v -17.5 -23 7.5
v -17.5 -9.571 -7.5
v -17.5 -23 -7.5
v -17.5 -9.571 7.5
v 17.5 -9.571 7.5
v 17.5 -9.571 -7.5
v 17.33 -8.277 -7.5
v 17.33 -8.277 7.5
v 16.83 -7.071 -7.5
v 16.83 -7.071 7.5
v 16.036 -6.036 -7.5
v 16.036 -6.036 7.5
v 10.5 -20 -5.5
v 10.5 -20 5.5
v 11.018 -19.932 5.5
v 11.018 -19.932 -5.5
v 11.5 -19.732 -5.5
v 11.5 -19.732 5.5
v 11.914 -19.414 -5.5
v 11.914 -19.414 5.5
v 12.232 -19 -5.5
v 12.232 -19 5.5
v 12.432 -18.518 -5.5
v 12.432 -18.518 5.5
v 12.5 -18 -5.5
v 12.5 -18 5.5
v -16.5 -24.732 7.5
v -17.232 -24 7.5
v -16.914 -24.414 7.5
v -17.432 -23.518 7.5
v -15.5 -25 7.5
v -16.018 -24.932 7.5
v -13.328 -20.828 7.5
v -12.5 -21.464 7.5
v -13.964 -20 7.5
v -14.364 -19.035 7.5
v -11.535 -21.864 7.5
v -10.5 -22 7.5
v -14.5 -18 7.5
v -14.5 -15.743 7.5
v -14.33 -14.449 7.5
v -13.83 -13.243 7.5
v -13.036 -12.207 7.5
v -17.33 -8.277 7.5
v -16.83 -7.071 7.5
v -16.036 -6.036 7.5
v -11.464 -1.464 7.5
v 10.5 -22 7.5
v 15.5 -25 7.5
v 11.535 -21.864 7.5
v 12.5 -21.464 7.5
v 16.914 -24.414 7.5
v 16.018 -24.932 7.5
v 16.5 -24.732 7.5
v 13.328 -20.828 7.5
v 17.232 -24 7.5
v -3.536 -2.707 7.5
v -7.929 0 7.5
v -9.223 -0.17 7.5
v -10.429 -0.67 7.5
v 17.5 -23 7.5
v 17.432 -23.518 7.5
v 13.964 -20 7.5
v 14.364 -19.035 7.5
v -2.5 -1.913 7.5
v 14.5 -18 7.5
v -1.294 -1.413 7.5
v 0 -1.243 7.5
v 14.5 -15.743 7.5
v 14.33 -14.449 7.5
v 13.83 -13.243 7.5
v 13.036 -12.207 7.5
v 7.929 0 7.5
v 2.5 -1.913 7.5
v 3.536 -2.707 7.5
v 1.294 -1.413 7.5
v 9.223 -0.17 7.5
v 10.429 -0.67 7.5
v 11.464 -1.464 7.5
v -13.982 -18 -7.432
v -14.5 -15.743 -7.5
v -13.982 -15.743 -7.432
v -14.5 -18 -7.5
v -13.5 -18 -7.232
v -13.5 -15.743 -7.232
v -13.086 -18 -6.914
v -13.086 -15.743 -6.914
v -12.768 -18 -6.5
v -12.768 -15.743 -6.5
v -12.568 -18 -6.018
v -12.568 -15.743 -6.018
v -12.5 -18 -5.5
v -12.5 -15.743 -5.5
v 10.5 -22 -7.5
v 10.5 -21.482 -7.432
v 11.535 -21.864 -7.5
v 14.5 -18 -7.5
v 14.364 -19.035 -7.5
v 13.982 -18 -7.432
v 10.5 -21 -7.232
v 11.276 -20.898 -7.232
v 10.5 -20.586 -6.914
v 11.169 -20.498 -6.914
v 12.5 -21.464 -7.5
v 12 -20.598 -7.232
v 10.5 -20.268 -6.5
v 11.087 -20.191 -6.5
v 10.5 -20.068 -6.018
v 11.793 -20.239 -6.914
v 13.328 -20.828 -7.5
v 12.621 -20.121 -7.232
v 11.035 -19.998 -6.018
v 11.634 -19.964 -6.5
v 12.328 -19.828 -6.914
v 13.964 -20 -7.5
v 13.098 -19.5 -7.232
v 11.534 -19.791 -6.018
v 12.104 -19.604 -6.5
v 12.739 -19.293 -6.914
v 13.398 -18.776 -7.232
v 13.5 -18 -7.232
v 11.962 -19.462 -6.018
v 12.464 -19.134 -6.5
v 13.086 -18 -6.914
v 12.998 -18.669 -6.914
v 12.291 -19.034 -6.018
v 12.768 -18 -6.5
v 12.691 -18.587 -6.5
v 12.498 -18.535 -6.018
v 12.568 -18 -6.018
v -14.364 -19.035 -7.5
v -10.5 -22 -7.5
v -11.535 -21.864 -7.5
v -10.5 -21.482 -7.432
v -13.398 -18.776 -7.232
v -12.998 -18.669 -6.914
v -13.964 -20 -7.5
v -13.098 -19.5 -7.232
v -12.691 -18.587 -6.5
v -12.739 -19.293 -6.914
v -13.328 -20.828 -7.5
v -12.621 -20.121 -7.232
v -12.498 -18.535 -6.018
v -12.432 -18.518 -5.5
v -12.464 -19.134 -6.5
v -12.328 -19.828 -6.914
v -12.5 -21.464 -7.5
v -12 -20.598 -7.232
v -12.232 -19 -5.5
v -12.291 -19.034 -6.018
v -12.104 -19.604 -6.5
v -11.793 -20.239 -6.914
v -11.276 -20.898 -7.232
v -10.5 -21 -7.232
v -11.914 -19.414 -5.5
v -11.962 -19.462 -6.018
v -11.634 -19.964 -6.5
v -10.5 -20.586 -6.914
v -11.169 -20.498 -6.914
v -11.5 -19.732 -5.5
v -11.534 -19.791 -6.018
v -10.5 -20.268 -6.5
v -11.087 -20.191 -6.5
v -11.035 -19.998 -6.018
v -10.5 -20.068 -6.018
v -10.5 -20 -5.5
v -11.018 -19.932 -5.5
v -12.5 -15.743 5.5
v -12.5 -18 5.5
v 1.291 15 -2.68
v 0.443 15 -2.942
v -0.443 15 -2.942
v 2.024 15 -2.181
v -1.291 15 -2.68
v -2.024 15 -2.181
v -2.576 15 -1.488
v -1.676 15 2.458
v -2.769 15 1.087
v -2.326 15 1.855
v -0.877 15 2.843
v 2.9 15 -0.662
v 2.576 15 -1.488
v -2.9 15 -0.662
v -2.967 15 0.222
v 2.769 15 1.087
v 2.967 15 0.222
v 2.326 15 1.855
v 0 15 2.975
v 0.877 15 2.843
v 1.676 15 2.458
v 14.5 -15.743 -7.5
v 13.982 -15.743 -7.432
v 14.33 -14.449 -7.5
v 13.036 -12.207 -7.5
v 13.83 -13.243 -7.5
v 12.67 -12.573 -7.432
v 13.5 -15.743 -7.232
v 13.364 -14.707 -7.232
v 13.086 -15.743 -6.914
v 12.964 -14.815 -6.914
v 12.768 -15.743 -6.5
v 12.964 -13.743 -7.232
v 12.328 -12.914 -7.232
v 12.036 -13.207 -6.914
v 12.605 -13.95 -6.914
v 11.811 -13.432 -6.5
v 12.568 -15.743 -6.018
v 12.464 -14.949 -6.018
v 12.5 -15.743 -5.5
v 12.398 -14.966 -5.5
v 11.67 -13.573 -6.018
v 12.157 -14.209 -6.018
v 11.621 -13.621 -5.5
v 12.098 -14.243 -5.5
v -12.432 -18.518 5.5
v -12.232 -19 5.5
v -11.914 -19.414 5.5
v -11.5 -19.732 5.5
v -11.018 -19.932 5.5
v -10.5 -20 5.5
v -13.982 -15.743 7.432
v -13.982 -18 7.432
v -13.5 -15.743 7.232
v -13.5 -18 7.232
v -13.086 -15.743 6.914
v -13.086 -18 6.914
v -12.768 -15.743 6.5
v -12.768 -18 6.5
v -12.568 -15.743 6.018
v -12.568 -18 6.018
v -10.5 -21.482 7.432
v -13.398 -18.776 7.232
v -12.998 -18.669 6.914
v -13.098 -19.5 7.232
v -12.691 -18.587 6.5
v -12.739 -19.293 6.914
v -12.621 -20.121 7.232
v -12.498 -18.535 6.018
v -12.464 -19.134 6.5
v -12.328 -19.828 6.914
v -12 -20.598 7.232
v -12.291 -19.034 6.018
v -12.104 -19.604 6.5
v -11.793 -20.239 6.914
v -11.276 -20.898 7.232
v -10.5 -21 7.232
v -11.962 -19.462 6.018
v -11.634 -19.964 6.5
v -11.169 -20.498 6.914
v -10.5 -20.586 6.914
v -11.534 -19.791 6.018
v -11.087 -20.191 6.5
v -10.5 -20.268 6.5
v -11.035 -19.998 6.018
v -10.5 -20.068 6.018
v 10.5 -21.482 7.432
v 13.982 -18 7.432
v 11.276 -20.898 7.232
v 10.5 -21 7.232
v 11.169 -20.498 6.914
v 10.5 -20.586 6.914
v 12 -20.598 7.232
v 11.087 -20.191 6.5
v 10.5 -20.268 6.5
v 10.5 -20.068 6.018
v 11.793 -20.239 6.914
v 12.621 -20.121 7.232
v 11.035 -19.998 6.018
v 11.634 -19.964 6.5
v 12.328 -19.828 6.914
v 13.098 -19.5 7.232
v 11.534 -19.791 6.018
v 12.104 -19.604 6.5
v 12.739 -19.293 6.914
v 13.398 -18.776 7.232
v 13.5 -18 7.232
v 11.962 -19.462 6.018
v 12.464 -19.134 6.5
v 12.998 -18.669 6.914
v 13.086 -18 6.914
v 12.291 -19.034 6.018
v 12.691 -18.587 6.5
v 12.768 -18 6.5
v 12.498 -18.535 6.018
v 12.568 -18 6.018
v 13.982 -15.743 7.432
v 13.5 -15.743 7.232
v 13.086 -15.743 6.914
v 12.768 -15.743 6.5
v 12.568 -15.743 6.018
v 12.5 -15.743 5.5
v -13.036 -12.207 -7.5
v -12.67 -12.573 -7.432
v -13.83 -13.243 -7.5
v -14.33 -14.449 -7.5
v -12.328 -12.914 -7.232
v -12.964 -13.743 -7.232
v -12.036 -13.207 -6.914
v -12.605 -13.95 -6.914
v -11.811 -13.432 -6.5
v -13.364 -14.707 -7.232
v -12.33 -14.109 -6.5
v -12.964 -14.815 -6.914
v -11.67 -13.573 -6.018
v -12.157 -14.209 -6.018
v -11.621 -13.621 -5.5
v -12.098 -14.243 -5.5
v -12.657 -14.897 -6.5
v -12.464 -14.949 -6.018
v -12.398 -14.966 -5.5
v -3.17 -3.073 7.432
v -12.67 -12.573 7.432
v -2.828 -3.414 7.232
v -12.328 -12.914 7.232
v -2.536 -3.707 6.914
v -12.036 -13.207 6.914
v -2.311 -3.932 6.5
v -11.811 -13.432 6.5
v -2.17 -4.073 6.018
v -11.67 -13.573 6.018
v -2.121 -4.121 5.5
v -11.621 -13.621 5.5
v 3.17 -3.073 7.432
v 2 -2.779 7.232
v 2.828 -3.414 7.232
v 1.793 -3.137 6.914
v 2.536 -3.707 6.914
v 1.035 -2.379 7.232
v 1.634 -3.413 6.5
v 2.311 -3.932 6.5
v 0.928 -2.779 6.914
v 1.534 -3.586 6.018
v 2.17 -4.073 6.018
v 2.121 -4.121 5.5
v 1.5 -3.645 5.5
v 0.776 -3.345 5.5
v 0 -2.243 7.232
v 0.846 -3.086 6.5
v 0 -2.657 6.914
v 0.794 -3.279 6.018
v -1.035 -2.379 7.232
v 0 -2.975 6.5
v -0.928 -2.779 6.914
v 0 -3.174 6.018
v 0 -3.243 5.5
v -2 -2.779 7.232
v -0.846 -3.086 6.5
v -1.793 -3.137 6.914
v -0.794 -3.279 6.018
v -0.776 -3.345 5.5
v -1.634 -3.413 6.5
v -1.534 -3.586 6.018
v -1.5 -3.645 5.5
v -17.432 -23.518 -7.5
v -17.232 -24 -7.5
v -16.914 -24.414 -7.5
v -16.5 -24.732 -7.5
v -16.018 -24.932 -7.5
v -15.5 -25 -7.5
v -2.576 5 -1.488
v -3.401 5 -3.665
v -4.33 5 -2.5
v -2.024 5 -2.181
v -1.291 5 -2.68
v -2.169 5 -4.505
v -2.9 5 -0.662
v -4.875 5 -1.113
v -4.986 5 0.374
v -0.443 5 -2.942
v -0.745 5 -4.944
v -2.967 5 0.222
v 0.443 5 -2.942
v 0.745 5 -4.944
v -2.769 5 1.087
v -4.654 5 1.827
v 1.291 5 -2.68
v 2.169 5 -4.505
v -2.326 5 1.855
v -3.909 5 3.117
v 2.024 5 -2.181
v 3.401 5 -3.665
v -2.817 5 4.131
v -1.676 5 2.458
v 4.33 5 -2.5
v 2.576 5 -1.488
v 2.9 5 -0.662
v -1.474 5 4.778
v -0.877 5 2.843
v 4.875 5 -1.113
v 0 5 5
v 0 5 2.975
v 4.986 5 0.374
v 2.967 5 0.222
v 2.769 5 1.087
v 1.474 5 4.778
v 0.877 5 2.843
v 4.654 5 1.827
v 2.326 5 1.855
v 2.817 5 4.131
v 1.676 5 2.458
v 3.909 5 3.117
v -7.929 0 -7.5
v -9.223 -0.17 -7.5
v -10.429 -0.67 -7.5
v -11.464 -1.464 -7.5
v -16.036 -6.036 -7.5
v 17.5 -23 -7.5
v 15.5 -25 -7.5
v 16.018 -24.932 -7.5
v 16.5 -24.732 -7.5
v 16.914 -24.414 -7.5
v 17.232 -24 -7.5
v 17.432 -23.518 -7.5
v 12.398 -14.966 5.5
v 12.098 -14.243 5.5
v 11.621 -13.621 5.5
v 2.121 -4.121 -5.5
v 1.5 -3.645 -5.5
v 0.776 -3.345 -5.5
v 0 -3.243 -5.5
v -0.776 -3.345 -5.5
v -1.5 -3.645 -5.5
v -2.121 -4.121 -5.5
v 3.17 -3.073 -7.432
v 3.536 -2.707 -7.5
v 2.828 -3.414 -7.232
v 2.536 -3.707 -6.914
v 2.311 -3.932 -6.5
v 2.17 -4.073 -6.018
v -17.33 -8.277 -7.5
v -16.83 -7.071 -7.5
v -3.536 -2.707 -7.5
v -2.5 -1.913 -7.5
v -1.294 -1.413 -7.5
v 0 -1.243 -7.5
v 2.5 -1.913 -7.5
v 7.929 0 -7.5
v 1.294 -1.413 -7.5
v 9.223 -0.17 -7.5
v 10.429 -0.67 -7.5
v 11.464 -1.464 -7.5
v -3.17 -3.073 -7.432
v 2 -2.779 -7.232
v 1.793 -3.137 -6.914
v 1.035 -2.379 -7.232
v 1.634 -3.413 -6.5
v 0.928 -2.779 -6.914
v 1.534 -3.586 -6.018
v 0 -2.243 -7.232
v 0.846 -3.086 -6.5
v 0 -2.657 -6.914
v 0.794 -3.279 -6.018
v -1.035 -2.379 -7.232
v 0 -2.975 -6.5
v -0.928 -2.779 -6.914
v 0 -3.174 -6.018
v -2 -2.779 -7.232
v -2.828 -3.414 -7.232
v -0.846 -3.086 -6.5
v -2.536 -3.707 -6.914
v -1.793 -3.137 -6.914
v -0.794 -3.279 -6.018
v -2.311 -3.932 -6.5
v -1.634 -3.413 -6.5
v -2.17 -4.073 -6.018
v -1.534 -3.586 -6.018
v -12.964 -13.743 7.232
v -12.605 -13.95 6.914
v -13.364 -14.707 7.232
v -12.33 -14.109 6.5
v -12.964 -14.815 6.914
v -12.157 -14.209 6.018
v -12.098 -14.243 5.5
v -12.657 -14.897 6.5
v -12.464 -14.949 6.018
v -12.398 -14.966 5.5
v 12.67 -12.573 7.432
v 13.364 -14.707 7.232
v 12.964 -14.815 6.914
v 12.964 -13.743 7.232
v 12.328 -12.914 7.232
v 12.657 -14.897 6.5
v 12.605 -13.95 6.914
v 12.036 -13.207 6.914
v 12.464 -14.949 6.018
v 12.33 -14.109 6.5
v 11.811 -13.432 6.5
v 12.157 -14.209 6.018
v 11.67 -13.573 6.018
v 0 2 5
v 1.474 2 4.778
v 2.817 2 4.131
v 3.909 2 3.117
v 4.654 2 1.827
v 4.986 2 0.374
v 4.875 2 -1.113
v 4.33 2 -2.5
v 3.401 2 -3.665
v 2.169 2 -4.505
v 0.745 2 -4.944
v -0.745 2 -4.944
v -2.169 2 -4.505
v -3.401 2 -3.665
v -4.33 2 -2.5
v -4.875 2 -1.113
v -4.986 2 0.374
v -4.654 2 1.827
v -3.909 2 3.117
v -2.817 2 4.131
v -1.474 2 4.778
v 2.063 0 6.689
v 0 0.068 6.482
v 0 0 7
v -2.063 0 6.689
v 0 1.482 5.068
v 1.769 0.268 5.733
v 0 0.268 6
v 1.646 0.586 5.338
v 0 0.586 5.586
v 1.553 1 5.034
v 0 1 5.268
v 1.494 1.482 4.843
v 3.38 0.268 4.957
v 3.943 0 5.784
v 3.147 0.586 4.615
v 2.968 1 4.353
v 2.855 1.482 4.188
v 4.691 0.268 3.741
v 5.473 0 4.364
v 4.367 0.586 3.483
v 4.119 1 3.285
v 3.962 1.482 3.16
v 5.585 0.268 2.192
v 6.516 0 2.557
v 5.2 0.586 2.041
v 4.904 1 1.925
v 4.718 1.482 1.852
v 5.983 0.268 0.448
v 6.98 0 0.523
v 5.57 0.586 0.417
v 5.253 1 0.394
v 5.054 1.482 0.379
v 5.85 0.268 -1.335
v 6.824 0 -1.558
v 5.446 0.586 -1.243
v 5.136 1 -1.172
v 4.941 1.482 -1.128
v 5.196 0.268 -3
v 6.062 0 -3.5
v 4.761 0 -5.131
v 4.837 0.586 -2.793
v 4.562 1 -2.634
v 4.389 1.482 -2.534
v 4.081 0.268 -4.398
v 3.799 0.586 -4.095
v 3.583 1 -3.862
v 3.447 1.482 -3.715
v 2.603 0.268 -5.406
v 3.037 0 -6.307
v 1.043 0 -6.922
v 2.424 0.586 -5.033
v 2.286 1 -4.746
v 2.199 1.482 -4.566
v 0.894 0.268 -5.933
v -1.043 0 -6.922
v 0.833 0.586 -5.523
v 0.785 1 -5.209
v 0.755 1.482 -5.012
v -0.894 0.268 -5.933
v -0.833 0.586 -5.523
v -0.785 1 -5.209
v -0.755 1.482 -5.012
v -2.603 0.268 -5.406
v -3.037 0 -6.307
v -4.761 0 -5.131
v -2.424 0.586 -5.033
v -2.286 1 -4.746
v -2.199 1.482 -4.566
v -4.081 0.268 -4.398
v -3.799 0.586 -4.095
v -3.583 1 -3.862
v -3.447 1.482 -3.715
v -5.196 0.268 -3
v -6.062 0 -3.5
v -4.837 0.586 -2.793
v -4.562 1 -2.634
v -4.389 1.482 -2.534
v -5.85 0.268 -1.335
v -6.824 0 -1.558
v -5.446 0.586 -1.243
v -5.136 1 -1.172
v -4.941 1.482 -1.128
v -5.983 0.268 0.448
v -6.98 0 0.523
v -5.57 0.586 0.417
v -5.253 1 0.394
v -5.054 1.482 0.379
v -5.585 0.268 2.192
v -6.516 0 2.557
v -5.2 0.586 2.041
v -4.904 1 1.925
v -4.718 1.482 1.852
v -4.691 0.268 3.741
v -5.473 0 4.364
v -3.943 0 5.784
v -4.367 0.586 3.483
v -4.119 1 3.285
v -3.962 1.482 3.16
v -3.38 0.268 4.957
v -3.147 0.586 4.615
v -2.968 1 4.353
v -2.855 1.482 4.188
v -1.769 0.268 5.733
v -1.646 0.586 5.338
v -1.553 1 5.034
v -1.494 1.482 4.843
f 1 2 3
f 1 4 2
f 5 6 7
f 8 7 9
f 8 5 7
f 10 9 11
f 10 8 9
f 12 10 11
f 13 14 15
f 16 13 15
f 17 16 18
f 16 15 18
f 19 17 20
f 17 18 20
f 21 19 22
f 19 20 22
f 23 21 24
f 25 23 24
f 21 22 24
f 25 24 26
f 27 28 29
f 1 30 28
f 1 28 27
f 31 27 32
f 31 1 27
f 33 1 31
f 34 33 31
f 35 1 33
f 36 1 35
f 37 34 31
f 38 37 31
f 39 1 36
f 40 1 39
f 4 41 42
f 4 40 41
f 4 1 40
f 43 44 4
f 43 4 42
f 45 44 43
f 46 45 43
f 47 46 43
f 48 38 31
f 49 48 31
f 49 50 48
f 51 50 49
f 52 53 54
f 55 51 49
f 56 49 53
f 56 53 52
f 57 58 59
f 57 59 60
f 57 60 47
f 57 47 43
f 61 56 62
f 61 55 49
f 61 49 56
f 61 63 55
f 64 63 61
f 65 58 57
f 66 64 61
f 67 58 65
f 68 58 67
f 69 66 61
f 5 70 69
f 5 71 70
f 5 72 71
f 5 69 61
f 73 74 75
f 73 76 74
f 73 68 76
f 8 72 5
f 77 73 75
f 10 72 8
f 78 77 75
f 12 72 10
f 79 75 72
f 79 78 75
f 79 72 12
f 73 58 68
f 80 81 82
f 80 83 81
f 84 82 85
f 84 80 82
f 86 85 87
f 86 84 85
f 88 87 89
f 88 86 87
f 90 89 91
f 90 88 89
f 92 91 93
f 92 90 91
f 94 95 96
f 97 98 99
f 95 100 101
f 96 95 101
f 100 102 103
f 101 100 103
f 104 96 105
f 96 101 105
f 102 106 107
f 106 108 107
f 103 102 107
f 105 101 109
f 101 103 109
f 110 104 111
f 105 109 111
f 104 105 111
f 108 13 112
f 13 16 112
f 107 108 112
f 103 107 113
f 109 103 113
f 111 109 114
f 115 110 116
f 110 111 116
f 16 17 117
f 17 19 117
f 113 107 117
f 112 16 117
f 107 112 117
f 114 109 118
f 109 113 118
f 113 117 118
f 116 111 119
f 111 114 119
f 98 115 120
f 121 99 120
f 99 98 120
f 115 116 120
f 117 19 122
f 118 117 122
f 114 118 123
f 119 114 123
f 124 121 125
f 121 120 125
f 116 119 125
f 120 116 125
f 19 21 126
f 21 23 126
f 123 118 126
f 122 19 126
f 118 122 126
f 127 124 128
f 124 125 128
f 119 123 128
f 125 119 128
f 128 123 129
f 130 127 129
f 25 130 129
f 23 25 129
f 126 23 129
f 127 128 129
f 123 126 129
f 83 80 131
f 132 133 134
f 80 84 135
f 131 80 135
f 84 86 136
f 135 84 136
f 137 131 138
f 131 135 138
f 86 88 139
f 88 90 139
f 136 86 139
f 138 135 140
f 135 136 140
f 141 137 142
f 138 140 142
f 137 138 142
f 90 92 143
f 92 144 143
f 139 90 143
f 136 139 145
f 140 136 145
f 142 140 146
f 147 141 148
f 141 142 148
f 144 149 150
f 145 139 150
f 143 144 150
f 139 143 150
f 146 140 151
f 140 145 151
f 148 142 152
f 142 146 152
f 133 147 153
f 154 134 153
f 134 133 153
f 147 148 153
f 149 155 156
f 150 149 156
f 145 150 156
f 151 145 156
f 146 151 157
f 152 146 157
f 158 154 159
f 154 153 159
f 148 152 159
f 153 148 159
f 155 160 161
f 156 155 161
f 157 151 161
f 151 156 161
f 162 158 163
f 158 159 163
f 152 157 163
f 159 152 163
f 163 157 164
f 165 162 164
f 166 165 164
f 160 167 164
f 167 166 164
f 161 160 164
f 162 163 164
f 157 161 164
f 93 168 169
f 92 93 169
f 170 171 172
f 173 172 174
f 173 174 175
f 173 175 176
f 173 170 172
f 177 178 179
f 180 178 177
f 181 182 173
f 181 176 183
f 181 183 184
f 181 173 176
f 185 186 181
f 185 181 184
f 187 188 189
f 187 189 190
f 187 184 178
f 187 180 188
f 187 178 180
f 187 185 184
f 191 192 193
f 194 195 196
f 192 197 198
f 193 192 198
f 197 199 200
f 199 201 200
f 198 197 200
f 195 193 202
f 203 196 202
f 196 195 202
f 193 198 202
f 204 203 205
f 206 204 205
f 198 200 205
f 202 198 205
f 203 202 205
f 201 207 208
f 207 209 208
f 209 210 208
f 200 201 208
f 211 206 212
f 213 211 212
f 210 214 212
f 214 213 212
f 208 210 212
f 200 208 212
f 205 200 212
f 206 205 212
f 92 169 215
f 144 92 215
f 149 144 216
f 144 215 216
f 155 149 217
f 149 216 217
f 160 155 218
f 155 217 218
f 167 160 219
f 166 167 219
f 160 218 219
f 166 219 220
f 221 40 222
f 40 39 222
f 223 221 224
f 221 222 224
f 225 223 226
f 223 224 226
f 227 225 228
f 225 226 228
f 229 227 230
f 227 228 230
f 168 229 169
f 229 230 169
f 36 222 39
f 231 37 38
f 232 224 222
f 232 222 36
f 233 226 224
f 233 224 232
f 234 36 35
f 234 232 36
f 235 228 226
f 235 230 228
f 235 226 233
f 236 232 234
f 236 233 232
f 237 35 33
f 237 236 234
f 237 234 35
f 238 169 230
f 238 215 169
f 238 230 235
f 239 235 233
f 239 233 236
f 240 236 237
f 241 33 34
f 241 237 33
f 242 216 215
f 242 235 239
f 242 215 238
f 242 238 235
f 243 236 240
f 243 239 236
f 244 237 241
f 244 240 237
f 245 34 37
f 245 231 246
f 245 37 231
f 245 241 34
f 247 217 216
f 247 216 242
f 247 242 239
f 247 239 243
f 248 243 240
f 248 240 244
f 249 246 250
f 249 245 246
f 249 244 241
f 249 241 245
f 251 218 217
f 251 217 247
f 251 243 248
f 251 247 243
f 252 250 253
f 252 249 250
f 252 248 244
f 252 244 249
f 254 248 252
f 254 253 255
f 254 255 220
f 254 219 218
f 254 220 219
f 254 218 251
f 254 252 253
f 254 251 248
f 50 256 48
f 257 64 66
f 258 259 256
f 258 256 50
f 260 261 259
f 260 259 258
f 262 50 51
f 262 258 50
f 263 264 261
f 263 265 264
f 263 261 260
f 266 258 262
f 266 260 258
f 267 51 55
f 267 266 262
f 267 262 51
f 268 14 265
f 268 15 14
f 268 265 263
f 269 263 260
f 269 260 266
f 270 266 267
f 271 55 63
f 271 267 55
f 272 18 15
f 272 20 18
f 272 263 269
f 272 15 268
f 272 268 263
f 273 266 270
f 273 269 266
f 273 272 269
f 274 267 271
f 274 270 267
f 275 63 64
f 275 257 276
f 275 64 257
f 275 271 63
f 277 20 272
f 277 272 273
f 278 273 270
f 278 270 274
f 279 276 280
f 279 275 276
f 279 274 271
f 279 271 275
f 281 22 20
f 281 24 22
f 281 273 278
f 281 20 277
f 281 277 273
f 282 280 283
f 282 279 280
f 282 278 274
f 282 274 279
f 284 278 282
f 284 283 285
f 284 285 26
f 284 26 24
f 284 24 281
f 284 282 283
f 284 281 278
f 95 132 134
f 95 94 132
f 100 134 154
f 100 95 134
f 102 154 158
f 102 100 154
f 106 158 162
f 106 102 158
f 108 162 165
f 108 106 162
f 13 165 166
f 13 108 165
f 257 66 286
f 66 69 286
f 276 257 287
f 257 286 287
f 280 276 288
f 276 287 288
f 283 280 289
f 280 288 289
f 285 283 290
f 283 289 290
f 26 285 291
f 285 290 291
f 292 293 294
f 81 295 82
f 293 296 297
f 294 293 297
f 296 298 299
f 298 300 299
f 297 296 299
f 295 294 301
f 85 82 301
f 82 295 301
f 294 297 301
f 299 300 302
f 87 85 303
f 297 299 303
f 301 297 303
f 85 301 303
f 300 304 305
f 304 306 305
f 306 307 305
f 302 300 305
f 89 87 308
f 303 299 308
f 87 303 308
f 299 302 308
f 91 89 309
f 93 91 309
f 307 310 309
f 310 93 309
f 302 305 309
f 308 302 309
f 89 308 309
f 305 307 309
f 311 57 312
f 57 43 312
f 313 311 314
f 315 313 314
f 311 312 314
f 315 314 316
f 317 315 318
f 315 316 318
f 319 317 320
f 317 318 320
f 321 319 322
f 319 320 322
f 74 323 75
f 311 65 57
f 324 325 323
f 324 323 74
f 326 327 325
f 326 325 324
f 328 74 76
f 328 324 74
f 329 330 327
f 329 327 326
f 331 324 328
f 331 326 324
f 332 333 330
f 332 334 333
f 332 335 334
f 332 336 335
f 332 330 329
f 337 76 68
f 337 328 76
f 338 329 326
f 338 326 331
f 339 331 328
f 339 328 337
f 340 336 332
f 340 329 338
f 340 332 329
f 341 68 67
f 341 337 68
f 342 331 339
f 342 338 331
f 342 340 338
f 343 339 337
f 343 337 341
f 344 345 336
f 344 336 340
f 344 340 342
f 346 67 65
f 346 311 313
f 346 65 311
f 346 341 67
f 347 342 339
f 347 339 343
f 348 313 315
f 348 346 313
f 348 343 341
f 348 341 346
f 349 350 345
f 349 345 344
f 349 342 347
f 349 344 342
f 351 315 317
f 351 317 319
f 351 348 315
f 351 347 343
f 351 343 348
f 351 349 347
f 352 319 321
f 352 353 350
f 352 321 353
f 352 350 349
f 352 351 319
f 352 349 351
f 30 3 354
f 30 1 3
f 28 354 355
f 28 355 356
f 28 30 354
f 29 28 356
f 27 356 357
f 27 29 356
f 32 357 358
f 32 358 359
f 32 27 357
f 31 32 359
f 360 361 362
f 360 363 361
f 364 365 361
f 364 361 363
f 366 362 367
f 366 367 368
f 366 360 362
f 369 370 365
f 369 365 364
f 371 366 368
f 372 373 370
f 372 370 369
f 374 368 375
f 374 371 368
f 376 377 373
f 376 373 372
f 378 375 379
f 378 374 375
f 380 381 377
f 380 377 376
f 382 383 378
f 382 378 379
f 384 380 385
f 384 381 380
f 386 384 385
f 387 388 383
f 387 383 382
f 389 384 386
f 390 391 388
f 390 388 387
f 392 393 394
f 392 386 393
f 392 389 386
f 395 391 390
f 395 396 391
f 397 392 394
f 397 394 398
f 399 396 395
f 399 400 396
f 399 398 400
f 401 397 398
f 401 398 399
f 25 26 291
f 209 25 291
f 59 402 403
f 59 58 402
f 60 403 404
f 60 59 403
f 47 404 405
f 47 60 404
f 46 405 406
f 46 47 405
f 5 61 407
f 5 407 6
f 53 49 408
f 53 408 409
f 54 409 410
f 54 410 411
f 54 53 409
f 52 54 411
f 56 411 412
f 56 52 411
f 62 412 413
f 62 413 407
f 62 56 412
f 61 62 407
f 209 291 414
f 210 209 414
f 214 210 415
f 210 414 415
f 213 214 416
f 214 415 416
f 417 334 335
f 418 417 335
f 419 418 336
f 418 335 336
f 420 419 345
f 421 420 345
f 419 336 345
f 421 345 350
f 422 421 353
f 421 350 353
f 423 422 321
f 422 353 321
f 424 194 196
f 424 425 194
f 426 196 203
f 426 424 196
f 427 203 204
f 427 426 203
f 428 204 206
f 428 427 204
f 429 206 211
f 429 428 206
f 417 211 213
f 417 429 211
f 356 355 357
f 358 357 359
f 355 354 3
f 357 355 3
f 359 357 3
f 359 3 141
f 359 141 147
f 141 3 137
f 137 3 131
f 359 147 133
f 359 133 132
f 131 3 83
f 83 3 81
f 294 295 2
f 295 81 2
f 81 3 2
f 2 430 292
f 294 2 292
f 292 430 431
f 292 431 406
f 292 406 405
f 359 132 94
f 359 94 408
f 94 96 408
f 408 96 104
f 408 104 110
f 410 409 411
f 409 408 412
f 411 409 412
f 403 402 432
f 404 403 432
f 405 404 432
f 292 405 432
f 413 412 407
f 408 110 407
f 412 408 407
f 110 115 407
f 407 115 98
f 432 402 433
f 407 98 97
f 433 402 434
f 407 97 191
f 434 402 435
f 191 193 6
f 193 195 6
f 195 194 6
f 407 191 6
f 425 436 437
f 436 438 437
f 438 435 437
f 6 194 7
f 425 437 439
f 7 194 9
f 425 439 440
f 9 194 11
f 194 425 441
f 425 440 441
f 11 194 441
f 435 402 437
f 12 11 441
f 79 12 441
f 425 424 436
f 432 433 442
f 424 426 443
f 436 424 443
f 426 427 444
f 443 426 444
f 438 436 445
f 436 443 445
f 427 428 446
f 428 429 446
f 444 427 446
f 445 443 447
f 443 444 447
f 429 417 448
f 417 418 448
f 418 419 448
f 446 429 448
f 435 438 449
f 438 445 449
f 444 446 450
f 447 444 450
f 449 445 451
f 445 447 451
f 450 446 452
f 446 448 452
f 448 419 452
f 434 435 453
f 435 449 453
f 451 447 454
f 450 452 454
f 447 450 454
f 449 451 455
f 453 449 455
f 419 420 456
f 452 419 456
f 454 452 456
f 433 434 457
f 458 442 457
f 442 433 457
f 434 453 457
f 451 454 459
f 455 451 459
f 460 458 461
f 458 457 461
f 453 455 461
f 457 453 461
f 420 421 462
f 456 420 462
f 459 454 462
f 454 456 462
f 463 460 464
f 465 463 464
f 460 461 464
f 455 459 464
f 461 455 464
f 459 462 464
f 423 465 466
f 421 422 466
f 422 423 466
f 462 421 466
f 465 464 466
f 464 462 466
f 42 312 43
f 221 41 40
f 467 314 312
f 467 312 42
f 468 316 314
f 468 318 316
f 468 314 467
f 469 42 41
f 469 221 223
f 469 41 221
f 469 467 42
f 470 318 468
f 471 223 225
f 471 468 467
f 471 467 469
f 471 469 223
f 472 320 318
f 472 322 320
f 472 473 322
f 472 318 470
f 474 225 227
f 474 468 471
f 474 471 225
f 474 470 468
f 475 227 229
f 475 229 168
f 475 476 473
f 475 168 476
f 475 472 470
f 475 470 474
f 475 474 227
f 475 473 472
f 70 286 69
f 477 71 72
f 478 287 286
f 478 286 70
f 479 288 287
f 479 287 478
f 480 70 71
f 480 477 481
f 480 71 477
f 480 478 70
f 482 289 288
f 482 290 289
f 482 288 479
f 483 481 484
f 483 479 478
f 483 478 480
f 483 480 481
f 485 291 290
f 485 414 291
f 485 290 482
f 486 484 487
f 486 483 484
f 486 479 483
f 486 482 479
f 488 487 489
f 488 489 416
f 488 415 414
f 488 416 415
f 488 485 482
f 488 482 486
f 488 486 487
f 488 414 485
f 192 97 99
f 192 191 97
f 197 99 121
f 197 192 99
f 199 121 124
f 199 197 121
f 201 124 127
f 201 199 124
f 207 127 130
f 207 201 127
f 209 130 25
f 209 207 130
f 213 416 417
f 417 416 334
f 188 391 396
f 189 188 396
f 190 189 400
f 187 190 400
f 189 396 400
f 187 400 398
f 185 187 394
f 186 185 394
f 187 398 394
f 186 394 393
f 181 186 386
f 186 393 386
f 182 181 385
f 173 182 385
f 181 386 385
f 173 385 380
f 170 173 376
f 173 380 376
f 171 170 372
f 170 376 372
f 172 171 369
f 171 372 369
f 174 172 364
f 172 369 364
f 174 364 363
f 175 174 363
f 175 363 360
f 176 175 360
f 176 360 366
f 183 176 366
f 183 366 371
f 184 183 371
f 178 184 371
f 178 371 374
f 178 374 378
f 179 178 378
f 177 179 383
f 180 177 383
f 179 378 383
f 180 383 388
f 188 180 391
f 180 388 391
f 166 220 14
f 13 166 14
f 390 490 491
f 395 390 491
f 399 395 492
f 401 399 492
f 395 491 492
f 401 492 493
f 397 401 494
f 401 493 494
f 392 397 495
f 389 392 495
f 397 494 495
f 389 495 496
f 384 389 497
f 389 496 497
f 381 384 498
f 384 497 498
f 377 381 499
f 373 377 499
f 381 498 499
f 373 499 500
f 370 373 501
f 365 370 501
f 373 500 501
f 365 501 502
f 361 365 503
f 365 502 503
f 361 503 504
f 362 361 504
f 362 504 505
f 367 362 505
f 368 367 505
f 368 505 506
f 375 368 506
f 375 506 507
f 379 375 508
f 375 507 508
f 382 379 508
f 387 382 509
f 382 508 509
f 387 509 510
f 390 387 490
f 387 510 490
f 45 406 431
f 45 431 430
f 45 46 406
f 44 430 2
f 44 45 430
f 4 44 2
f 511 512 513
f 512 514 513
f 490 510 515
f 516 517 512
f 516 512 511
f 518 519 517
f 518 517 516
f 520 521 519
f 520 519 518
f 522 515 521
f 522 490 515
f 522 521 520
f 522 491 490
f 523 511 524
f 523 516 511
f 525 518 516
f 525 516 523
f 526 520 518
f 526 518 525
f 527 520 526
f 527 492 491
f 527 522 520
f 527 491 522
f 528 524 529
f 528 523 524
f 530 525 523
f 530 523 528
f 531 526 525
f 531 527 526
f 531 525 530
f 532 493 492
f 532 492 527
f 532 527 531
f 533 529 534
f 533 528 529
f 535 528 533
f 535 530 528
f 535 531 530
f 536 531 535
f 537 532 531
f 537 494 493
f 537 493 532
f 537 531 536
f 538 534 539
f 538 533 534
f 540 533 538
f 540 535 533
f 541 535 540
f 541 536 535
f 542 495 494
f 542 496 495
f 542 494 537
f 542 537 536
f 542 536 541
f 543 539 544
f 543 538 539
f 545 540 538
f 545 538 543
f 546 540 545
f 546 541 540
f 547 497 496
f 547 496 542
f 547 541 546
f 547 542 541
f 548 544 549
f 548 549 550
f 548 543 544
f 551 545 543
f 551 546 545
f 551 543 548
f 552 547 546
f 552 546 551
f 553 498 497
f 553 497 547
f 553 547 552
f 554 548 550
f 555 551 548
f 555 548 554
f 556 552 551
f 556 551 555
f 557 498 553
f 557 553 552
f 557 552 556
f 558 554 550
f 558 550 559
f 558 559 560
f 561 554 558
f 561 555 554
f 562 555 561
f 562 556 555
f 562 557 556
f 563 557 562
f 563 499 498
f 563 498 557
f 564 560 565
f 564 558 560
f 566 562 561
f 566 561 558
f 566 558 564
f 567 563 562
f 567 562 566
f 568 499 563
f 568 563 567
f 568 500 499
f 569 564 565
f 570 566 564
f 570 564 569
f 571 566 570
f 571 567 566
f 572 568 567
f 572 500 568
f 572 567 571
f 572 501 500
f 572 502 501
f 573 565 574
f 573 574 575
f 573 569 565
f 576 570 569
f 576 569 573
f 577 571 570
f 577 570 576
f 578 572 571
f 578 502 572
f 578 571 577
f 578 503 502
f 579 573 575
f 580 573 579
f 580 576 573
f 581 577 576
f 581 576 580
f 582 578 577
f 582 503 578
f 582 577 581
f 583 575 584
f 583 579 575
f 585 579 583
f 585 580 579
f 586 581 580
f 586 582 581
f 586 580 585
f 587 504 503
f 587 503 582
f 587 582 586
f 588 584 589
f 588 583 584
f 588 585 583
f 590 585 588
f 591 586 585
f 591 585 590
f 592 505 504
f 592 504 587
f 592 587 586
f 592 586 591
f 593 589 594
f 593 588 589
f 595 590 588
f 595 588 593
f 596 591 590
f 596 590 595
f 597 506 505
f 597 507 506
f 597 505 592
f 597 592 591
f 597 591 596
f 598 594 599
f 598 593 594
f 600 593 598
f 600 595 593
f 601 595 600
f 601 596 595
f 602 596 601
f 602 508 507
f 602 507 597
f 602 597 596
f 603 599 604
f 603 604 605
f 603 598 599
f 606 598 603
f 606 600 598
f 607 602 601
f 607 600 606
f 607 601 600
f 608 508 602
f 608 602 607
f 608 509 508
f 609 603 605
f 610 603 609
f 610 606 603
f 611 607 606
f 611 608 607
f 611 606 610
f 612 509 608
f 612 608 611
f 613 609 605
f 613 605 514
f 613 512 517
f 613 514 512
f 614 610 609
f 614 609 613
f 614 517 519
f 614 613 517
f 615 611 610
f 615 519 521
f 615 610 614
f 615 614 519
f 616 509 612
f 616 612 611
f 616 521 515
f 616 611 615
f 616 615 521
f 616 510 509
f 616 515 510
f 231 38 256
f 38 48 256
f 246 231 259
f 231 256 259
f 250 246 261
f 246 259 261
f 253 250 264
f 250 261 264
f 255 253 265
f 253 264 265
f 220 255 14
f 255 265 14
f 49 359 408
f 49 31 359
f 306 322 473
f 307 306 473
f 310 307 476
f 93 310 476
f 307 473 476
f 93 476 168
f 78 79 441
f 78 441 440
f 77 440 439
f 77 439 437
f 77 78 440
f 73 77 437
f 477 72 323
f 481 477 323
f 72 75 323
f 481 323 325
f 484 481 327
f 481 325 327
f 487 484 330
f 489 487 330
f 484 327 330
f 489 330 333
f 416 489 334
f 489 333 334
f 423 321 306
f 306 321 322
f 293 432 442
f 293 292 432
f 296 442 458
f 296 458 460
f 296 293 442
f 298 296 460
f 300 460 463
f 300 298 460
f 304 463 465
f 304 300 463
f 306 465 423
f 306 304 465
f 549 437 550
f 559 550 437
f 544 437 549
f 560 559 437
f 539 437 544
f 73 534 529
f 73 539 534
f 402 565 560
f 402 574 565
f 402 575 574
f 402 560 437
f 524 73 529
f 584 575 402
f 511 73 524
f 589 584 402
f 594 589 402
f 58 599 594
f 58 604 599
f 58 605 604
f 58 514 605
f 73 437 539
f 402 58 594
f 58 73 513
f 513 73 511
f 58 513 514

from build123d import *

# Parameters (mm, degrees)
SKETCH3_R           = 5
BOSS_EXTRUDE1_DEPTH = 5
SKETCH4_R           = 2.975
BOSS_EXTRUDE2_DEPTH = 10
BOSS_EXTRUDE5_DEPTH = 7.5
FILLET5_R           = 2
FILLET6_R           = 2


with BuildPart() as part:
    # Sketch3 → Boss-Extrude1 (new body)
    with BuildSketch(Plane(origin=(0, 0, 0), x_dir=(1, 0, 0), z_dir=(0, 1, 0))):
        with Locations(Location((0, 0, 0), (0, 0, 270))):
            Circle(SKETCH3_R)
    extrude(amount=BOSS_EXTRUDE1_DEPTH)

    # Sketch4 → Boss-Extrude2 (add)
    with BuildSketch(Plane(origin=(0, 5, 0), x_dir=(1, 0, 0), z_dir=(0, 1, 0))):
        with Locations(Location((0, 0, 0), (0, 0, 270))):
            Circle(SKETCH4_R)
    extrude(amount=BOSS_EXTRUDE2_DEPTH)

    # Sketch8 → Boss-Extrude5 (add, symmetric)
    with BuildSketch(Plane.XY):
        with BuildLine():
            Line((-15.5, -25), (15.5, -25))
            ThreePointArc((15.5, -25), (16.914213562, -24.414213562), (17.5, -23))
            Line((17.5, -23), (17.5, -9.571067812))
            ThreePointArc((17.5, -9.571067812), (17.119397663, -7.65765065), (16.035533906, -6.035533906))
            Line((16.035533906, -6.035533906), (11.464466094, -1.464466094))
            ThreePointArc((11.464466094, -1.464466094), (9.84234935, -0.380602337), (7.928932188, 0))
            Line((7.928932188, 0), (-7.928932188, 0))
            ThreePointArc((-7.928932188, 0), (-9.84234935, -0.380602337), (-11.464466094, -1.464466094))
            Line((-11.464466094, -1.464466094), (-16.035533906, -6.035533906))
            ThreePointArc((-16.035533906, -6.035533906), (-17.119397663, -7.65765065), (-17.5, -9.571067812))
            Line((-17.5, -9.571067812), (-17.5, -23))
            ThreePointArc((-17.5, -23), (-16.914213562, -24.414213562), (-15.5, -25))
        make_face()
        with BuildLine():
            Line((-12.5, -15.742640687), (-12.5, -18))
            ThreePointArc((-12.5, -18), (-11.914213562, -19.414213562), (-10.5, -20))
            Line((-10.5, -20), (10.5, -20))
            ThreePointArc((10.5, -20), (11.914213562, -19.414213562), (12.5, -18))
            Line((12.5, -18), (12.5, -15.742640687))
            ThreePointArc((12.5, -15.742640687), (12.271638598, -14.59459039), (11.621320344, -13.621320344))
            Line((11.621320344, -13.621320344), (2.121320344, -4.121320344))
            ThreePointArc((2.121320344, -4.121320344), (0, -3.242640687), (-2.121320344, -4.121320344))
            Line((-2.121320344, -4.121320344), (-11.621320344, -13.621320344))
            ThreePointArc((-11.621320344, -13.621320344), (-12.271638598, -14.59459039), (-12.5, -15.742640687))
        make_face(mode=Mode.SUBTRACT)
    extrude(amount=BOSS_EXTRUDE5_DEPTH, both=True)

    # Fillet5
    fillet5_edges = [part.edges().sort_by_distance(p)[0] for p in [
        (0, 0, -5),
    ]]
    fillet(fillet5_edges, radius=FILLET5_R)

    # Fillet6
    fillet6_edges = [part.edges().sort_by_distance(p)[0] for p in [
        (6.871320344, -8.871320344, -7.5),
        (0, -3.242640687, -7.5),
        (-6.871320344, -8.871320344, -7.5),
        (-12.271638598, -14.59459039, -7.5),
        (-12.5, -16.871320344, -7.5),
        (-11.914213562, -19.414213562, -7.5),
        (0, -20, -7.5),
        (11.914213562, -19.414213562, -7.5),
        (12.5, -16.871320344, -7.5),
        (12.271638598, -14.59459039, -7.5),
        (0, -3.242640687, 7.5),
        (-6.871320344, -8.871320344, 7.5),
        (-12.271638598, -14.59459039, 7.5),
        (-12.5, -16.871320344, 7.5),
        (-11.914213562, -19.414213562, 7.5),
        (0, -20, 7.5),
        (11.914213562, -19.414213562, 7.5),
        (12.5, -16.871320344, 7.5),
        (12.271638598, -14.59459039, 7.5),
        (6.871320344, -8.871320344, 7.5),
    ]]
    fillet(fillet6_edges, radius=FILLET6_R)


solid = part.part
